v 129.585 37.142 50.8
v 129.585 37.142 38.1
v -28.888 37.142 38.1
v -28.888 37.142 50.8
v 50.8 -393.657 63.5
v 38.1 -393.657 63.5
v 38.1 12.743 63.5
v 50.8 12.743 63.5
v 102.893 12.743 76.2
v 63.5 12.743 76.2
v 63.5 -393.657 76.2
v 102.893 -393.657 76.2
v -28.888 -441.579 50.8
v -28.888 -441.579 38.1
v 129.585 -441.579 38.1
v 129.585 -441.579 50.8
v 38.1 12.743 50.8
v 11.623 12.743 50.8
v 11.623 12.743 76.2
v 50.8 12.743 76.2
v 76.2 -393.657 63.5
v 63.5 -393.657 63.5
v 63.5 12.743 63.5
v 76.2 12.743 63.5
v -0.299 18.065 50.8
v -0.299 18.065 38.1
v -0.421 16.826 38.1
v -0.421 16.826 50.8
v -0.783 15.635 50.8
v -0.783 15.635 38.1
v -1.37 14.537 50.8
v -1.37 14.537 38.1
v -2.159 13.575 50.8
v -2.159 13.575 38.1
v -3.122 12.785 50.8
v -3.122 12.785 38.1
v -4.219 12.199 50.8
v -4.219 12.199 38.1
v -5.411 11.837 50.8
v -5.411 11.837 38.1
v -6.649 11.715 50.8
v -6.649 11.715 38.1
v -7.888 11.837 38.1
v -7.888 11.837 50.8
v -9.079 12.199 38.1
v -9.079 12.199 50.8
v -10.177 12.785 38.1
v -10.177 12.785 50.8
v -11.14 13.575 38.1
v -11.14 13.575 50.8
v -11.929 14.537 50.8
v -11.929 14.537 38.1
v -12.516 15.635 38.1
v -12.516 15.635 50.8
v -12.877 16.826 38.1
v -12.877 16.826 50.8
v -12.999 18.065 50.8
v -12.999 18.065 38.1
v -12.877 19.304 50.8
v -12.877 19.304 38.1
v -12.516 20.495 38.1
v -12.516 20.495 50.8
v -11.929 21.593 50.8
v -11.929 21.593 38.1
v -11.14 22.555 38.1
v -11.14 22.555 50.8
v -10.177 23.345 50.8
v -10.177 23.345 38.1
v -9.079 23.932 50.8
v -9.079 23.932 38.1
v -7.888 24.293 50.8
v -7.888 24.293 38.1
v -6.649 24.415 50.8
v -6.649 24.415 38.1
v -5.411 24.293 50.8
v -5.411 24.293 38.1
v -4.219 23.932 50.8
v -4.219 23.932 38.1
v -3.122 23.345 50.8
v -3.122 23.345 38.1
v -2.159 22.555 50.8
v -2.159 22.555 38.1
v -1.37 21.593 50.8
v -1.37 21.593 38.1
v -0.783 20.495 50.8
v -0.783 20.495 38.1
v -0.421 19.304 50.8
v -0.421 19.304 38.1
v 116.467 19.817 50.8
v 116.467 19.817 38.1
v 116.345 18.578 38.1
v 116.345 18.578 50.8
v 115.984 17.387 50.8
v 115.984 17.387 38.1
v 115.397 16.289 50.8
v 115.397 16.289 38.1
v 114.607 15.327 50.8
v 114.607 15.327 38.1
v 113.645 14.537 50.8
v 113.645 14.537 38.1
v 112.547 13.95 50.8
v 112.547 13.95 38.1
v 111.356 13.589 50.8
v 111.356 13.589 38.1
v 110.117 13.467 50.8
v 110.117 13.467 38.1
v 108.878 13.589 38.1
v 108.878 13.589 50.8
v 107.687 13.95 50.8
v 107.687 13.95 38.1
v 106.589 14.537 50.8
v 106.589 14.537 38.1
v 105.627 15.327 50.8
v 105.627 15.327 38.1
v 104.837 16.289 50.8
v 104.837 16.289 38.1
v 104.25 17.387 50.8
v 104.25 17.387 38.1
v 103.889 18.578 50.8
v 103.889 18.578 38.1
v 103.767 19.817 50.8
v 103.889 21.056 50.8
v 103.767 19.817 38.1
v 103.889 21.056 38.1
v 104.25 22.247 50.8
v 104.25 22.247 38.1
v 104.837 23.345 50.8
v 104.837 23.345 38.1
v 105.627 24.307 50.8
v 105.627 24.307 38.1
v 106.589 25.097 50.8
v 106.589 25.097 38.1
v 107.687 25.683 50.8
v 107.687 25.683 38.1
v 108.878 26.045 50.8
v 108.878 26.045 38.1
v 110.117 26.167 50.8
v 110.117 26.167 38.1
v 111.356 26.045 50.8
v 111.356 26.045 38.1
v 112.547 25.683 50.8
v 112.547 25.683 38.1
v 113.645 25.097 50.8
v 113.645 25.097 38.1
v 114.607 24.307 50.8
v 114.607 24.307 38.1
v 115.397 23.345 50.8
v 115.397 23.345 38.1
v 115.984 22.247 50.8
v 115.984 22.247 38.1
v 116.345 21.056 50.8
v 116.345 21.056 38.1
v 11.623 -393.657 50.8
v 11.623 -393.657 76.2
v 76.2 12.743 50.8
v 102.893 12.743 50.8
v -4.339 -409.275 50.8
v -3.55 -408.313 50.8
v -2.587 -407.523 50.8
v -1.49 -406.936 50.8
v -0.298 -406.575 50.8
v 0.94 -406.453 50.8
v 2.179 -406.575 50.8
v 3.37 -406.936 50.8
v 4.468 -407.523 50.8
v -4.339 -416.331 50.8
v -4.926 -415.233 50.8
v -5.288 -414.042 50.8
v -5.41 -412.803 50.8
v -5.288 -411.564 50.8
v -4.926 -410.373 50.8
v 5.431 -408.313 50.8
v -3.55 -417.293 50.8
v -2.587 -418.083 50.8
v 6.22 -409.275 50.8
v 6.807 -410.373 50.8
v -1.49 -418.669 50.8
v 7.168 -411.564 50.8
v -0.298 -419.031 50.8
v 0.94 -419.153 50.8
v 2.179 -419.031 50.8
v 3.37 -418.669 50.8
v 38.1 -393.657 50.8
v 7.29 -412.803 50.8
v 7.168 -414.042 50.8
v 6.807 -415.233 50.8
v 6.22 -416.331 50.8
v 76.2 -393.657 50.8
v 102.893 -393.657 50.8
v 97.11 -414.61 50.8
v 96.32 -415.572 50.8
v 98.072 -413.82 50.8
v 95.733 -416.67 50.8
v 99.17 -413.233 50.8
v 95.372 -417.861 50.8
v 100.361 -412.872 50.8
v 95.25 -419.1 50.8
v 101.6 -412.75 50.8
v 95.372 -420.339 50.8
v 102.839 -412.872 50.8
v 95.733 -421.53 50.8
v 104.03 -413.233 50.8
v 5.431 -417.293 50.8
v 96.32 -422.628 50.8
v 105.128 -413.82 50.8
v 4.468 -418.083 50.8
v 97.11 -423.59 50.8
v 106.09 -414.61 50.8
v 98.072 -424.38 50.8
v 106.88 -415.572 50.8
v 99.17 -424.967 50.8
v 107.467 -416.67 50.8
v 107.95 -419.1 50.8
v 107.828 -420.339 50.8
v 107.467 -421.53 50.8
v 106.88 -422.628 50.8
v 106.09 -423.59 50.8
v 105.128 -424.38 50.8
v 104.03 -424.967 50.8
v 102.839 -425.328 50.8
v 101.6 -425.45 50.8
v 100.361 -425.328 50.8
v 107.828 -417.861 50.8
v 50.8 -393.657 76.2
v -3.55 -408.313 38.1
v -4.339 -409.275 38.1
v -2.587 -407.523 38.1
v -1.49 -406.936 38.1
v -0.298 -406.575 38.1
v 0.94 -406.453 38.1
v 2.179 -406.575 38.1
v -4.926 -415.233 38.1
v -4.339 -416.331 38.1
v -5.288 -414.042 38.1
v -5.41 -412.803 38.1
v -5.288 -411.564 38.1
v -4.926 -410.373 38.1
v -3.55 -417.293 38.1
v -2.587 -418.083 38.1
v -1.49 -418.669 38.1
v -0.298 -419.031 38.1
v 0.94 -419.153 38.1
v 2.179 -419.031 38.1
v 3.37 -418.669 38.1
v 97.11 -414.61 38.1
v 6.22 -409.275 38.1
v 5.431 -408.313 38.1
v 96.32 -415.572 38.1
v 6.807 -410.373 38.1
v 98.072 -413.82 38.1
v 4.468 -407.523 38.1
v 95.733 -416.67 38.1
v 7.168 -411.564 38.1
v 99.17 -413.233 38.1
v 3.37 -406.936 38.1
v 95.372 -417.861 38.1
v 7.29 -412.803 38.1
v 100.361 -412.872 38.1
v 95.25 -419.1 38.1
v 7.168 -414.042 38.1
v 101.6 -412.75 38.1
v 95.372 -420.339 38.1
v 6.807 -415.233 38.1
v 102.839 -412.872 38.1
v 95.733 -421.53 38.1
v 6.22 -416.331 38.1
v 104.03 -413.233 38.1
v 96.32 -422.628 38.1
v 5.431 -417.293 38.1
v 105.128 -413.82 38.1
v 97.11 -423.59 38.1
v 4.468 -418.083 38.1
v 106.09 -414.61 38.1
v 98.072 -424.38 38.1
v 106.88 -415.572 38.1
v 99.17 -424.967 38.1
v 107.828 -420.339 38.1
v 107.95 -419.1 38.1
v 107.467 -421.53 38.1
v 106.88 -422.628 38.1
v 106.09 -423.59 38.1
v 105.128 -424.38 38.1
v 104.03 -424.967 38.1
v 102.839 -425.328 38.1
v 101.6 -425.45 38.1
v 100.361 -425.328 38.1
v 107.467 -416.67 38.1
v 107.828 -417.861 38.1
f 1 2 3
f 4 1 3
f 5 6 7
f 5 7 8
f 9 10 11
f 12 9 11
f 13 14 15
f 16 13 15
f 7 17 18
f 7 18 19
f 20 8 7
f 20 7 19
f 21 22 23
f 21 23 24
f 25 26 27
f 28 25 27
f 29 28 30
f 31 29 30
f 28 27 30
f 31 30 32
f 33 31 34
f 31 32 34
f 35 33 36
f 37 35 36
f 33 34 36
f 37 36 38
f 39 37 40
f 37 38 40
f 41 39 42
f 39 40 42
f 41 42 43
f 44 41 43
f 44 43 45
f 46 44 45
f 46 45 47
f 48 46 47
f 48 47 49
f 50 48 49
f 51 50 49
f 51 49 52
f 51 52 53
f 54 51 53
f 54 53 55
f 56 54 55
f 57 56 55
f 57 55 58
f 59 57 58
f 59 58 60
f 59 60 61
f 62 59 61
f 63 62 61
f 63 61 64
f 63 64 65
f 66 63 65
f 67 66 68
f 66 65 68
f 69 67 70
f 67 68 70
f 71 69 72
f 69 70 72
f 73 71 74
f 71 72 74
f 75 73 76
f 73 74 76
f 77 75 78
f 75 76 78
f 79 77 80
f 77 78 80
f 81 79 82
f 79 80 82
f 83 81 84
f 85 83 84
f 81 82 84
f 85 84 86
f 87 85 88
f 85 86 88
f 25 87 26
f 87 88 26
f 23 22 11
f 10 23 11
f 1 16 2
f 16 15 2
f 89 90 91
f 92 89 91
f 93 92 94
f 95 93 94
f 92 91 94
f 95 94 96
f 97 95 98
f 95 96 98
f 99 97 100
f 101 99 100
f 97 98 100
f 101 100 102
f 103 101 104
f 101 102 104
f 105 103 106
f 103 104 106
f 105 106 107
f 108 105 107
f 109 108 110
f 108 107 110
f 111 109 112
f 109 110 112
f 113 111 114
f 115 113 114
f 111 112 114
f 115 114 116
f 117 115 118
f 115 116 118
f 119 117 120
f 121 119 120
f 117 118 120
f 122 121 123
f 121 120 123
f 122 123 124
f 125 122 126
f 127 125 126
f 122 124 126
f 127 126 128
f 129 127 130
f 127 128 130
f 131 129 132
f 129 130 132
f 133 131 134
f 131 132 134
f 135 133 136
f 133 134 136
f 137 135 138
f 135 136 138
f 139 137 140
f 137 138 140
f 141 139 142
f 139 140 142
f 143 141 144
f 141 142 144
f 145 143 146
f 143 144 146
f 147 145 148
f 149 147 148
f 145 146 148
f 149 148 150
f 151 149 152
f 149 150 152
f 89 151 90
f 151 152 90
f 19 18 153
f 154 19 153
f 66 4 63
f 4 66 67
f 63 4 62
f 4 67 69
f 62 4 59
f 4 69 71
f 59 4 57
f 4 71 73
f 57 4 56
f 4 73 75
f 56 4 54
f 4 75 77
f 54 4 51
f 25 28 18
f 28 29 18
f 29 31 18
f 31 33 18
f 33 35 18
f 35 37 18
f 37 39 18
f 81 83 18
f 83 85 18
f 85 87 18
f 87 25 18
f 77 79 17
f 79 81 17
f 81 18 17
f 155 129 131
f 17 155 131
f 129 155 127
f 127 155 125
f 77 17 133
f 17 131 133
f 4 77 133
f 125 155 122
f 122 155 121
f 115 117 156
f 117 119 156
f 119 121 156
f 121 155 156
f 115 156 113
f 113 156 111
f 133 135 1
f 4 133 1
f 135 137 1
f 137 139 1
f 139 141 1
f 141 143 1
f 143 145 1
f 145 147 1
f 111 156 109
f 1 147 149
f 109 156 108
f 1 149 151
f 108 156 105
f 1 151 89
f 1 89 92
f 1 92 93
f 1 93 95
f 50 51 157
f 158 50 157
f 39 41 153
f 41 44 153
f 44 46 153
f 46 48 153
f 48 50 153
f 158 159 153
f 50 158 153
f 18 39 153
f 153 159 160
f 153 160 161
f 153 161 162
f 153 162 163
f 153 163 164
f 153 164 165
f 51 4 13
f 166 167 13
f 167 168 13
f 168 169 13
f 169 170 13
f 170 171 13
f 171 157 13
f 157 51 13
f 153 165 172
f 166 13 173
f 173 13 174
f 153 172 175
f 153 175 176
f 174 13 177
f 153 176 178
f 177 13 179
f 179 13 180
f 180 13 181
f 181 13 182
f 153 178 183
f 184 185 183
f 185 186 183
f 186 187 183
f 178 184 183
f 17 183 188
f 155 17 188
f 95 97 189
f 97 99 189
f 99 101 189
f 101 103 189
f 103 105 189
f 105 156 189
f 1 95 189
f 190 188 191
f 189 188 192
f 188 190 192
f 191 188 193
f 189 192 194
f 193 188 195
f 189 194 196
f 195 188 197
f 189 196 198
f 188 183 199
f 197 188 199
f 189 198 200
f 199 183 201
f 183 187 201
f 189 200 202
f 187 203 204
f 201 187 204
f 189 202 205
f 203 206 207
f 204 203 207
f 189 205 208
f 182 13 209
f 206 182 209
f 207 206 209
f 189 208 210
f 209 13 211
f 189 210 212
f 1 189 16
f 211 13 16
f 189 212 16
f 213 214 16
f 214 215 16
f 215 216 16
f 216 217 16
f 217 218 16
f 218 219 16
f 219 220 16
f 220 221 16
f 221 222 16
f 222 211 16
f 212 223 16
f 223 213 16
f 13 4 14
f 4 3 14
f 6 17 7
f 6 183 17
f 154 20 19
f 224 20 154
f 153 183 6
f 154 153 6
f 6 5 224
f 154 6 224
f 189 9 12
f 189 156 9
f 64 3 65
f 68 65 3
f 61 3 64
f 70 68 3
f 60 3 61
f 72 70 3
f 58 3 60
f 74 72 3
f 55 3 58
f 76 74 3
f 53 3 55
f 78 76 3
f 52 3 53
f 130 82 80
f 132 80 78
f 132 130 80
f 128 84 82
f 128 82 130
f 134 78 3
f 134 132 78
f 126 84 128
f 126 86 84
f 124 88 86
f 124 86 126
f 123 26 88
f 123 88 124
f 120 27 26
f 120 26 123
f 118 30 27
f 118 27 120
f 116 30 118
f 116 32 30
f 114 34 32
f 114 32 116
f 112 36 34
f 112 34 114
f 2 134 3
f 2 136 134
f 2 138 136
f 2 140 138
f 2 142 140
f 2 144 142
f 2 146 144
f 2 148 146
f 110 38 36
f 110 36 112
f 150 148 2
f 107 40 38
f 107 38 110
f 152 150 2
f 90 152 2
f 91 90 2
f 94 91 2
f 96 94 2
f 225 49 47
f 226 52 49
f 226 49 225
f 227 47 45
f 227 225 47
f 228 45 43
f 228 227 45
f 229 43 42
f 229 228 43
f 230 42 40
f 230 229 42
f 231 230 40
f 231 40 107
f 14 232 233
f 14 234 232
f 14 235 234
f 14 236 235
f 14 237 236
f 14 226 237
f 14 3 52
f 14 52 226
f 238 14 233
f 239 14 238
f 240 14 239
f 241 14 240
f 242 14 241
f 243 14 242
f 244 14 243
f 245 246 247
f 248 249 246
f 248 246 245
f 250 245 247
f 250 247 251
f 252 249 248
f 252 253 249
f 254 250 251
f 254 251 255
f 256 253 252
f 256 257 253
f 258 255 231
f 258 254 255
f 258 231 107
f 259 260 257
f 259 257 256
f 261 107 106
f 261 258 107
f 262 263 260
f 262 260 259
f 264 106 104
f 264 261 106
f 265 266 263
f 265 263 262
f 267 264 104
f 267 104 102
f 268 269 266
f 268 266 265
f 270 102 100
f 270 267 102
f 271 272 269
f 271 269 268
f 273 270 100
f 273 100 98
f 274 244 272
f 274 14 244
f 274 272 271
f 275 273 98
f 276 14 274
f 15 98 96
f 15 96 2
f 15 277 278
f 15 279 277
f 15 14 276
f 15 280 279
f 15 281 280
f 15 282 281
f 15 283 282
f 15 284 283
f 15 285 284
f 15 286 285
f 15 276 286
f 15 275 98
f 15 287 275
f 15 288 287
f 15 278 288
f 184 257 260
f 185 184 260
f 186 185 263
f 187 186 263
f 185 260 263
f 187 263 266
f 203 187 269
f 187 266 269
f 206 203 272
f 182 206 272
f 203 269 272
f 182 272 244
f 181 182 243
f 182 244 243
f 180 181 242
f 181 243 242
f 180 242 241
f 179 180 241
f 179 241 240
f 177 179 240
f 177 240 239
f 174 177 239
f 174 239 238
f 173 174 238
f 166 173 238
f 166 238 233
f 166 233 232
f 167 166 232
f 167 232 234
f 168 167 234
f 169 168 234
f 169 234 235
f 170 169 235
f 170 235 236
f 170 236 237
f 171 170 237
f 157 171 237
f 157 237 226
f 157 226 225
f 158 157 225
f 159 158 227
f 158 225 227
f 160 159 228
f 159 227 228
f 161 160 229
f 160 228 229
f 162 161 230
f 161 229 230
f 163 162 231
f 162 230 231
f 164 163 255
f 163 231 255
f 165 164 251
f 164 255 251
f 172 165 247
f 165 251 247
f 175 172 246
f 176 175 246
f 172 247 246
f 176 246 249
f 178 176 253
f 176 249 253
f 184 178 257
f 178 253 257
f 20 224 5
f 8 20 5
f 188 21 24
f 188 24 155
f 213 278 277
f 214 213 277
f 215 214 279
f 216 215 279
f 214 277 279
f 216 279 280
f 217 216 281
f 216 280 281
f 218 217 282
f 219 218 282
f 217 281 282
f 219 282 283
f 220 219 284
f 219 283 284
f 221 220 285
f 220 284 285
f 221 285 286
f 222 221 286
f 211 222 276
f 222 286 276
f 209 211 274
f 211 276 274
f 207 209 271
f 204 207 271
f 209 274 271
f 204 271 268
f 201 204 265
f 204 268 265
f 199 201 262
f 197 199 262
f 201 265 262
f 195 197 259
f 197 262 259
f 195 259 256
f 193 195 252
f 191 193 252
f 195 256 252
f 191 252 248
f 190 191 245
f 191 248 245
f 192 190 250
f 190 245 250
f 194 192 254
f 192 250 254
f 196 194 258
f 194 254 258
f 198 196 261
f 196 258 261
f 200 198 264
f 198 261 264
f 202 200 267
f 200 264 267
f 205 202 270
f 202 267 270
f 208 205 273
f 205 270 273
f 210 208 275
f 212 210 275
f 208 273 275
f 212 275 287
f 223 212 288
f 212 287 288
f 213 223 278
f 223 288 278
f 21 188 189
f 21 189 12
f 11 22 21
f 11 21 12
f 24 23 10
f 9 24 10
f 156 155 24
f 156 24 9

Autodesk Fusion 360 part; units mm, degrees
sketch "Sketch1" plane through (0, 0, 0) normal (0, 0, 1) x (1, 0, 0)
  line L0 (-20, 30) -> (20.8523, 30)
  line L1 (20.8523, 30) -> (20.8523, -34.8194)
  line L2 (20.8523, -34.8194) -> (-20, -34.8194)
  line L3 (-20, -34.8194) -> (-20, 30)
sketch "Sketch2" plane through (0, 0, 0) normal (0, 0, 1) x (1, 0, 0)
  line L0 (-11.4066, 12.7433) -> (24.3229, 12.7433)
  line L1 (24.3229, 12.7433) -> (24.3229, -393.6567)
  line L2 (24.3229, -393.6567) -> (-11.4066, -393.6567)
  line L3 (-11.4066, -393.6567) -> (-11.4066, 12.7433)
  line L4 (-11.4066, 12.7433) -> (90.1934, 12.7433)
  line L5 (90.1934, 12.7433) -> (90.1934, -393.6567)
  line L6 (90.1934, -393.6567) -> (-11.4066, -393.6567)
  line L7 (-11.4066, -393.6567) -> (-11.4066, 12.7433)
  dimension "d3" = 406.4
  dimension "d4" = 101.6
extrude "Extrude2" add sketch "Sketch2" along normal blind 76.2 contours L1 L4 L5 L6
sketch "Sketch3" plane through (0, -393.6567, 0) normal (0, -1, 0) x (1, 0, 0)
  line L0 (24.3229, 0) -> (90.1934, 0)
  line L1 (90.1934, 0) -> (90.1934, 76.2)
  line L2 (90.1934, 76.2) -> (24.3229, 76.2)
  line L3 (24.3229, 76.2) -> (24.3229, 0)
sketch "Sketch4" plane through (0, -393.6567, 0) normal (0, -1, 0) x (1, 0, 0)
  line L0 (38.1, 63.5) -> (76.2, 63.5)
  line L1 (76.2, 63.5) -> (76.2, 50.8)
  line L2 (76.2, 50.8) -> (38.1, 50.8)
  line L3 (38.1, 50.8) -> (38.1, 63.5)
extrude "Extrude3" cut sketch "Sketch4" against normal blind 444.5
sketch "Sketch5" plane through (0, -393.6567, 0) normal (0, -1, 0) x (1, 0, 0)
  line L0 (50.8, 63.5) -> (63.5, 63.5)
  line L1 (63.5, 63.5) -> (63.5, 76.2)
  line L2 (63.5, 76.2) -> (50.8, 76.2)
  line L3 (50.8, 76.2) -> (50.8, 63.5)
extrude "Extrude4" cut sketch "Sketch5" against normal blind 419.1
sketch "Sketch6" plane through (0, 0, 76.2) normal (0, 0, 1) x (-1, 0, 0)
  line L0 (-50.8, 393.6567) -> (-50.8, -12.7433)
  line L1 (-50.8, -12.7433) -> (-24.3229, -12.7433)
  line L2 (-24.3229, -12.7433) -> (-24.3229, 393.6567)
  line L3 (-24.3229, 393.6567) -> (-50.8, 393.6567)
  line L4 (-6.8471, -24.8983) -> (-111.5412, -24.8983)
  line L5 (-111.5412, -24.8983) -> (-111.5412, 407.05)
  line L6 (-111.5412, 407.05) -> (-6.8471, 407.05)
  line L7 (-6.8471, 407.05) -> (-6.8471, -24.8983)
  circle A0 centre (-15.24, -17.78) radius 5.08
  circle A1 centre (-101.6, -17.78) radius 5.08
  circle A2 centre (-101.6, 398.78) radius 5.08
  circle A3 centre (-17.78, 398.78) radius 5.08
  point P0 (-12.7, 391.3931)
  dimension "d11" = 10.16
  dimension "d12" = 10.16
sketch "Sketch7" plane through (0, 0, 88.9) normal (0, 0, 1) x (-1, 0, 0)
sketch "Sketch8" plane through (0, 0, 0) normal (0, 0, -1) x (1, 0, 0)
  line L0 (24.3229, 393.6567) -> (24.3229, -12.7433)
  line L1 (24.3229, -12.7433) -> (90.1934, -12.7433)
  line L2 (90.1934, -12.7433) -> (90.1934, 393.6567)
  line L3 (90.1934, 393.6567) -> (24.3229, 393.6567)
  line L4 (129.5849, -37.1422) -> (-28.8884, -37.1422)
  line L5 (-28.8884, -37.1422) -> (-28.8884, 441.5791)
  line L6 (-28.8884, 441.5791) -> (129.5849, 441.5791)
  line L7 (129.5849, 441.5791) -> (129.5849, -37.1422)
  circle A0 centre (110.117, -19.8168) radius 6.35
  circle A1 centre (-6.6494, -18.0653) radius 6.35
  circle A2 centre (101.6, 419.1) radius 6.35
  circle A3 centre (0.9404, 412.8027) radius 6.35
  dimension "d15" = 12.7
  dimension "d16" = 12.7
  dimension "d17" = 12.7
  dimension "d18" = 12.7
extrude "Extrude6" add sketch "Sketch8" against normal blind 25.4
sketch "Sketch9" plane through (0, 0, 50.8) normal (0, 0, 1) x (-1, 0, 0)
  line L0 (-76.2, -12.7433) -> (-38.1, -12.7433)
  line L1 (-38.1, -12.7433) -> (-38.1, 393.6567)
  line L2 (-38.1, 393.6567) -> (-76.2, 393.6567)
  line L3 (-76.2, 393.6567) -> (-76.2, -12.7433)
extrude "Extrude7" add 1 faces at (14.3299, -123.04, 25.4) along direction (0, 0, 1) blind 25.4
sketch "Sketch10" plane through (0, -393.6567, 0) normal (0, -1, 0) x (1, 0, 0)
sketch "Sketch11" plane through (0, 37.1422, 0) normal (0, 1, 0) x (-1, 0, 0)
  line L0 (-129.5849, 0) -> (28.8884, 0)
  line L1 (28.8884, 0) -> (28.8884, 50.8)
  line L2 (28.8884, 50.8) -> (-129.5849, 50.8)
  line L3 (-129.5849, 50.8) -> (-129.5849, 0)
extrude "Extrude8" cut 1 faces at (35.4568, -126.9866, 0) along direction (0, 0, 1) blind 38.1
extrude "Extrude9" add 1 faces at (24.3229, -122.7234, 59.2667) along direction (-1, 0, 0) blind 12.7
extrude "Extrude10" add 1 faces at (90.1934, -122.7234, 59.2667) along direction (1, 0, 0) blind 12.7
